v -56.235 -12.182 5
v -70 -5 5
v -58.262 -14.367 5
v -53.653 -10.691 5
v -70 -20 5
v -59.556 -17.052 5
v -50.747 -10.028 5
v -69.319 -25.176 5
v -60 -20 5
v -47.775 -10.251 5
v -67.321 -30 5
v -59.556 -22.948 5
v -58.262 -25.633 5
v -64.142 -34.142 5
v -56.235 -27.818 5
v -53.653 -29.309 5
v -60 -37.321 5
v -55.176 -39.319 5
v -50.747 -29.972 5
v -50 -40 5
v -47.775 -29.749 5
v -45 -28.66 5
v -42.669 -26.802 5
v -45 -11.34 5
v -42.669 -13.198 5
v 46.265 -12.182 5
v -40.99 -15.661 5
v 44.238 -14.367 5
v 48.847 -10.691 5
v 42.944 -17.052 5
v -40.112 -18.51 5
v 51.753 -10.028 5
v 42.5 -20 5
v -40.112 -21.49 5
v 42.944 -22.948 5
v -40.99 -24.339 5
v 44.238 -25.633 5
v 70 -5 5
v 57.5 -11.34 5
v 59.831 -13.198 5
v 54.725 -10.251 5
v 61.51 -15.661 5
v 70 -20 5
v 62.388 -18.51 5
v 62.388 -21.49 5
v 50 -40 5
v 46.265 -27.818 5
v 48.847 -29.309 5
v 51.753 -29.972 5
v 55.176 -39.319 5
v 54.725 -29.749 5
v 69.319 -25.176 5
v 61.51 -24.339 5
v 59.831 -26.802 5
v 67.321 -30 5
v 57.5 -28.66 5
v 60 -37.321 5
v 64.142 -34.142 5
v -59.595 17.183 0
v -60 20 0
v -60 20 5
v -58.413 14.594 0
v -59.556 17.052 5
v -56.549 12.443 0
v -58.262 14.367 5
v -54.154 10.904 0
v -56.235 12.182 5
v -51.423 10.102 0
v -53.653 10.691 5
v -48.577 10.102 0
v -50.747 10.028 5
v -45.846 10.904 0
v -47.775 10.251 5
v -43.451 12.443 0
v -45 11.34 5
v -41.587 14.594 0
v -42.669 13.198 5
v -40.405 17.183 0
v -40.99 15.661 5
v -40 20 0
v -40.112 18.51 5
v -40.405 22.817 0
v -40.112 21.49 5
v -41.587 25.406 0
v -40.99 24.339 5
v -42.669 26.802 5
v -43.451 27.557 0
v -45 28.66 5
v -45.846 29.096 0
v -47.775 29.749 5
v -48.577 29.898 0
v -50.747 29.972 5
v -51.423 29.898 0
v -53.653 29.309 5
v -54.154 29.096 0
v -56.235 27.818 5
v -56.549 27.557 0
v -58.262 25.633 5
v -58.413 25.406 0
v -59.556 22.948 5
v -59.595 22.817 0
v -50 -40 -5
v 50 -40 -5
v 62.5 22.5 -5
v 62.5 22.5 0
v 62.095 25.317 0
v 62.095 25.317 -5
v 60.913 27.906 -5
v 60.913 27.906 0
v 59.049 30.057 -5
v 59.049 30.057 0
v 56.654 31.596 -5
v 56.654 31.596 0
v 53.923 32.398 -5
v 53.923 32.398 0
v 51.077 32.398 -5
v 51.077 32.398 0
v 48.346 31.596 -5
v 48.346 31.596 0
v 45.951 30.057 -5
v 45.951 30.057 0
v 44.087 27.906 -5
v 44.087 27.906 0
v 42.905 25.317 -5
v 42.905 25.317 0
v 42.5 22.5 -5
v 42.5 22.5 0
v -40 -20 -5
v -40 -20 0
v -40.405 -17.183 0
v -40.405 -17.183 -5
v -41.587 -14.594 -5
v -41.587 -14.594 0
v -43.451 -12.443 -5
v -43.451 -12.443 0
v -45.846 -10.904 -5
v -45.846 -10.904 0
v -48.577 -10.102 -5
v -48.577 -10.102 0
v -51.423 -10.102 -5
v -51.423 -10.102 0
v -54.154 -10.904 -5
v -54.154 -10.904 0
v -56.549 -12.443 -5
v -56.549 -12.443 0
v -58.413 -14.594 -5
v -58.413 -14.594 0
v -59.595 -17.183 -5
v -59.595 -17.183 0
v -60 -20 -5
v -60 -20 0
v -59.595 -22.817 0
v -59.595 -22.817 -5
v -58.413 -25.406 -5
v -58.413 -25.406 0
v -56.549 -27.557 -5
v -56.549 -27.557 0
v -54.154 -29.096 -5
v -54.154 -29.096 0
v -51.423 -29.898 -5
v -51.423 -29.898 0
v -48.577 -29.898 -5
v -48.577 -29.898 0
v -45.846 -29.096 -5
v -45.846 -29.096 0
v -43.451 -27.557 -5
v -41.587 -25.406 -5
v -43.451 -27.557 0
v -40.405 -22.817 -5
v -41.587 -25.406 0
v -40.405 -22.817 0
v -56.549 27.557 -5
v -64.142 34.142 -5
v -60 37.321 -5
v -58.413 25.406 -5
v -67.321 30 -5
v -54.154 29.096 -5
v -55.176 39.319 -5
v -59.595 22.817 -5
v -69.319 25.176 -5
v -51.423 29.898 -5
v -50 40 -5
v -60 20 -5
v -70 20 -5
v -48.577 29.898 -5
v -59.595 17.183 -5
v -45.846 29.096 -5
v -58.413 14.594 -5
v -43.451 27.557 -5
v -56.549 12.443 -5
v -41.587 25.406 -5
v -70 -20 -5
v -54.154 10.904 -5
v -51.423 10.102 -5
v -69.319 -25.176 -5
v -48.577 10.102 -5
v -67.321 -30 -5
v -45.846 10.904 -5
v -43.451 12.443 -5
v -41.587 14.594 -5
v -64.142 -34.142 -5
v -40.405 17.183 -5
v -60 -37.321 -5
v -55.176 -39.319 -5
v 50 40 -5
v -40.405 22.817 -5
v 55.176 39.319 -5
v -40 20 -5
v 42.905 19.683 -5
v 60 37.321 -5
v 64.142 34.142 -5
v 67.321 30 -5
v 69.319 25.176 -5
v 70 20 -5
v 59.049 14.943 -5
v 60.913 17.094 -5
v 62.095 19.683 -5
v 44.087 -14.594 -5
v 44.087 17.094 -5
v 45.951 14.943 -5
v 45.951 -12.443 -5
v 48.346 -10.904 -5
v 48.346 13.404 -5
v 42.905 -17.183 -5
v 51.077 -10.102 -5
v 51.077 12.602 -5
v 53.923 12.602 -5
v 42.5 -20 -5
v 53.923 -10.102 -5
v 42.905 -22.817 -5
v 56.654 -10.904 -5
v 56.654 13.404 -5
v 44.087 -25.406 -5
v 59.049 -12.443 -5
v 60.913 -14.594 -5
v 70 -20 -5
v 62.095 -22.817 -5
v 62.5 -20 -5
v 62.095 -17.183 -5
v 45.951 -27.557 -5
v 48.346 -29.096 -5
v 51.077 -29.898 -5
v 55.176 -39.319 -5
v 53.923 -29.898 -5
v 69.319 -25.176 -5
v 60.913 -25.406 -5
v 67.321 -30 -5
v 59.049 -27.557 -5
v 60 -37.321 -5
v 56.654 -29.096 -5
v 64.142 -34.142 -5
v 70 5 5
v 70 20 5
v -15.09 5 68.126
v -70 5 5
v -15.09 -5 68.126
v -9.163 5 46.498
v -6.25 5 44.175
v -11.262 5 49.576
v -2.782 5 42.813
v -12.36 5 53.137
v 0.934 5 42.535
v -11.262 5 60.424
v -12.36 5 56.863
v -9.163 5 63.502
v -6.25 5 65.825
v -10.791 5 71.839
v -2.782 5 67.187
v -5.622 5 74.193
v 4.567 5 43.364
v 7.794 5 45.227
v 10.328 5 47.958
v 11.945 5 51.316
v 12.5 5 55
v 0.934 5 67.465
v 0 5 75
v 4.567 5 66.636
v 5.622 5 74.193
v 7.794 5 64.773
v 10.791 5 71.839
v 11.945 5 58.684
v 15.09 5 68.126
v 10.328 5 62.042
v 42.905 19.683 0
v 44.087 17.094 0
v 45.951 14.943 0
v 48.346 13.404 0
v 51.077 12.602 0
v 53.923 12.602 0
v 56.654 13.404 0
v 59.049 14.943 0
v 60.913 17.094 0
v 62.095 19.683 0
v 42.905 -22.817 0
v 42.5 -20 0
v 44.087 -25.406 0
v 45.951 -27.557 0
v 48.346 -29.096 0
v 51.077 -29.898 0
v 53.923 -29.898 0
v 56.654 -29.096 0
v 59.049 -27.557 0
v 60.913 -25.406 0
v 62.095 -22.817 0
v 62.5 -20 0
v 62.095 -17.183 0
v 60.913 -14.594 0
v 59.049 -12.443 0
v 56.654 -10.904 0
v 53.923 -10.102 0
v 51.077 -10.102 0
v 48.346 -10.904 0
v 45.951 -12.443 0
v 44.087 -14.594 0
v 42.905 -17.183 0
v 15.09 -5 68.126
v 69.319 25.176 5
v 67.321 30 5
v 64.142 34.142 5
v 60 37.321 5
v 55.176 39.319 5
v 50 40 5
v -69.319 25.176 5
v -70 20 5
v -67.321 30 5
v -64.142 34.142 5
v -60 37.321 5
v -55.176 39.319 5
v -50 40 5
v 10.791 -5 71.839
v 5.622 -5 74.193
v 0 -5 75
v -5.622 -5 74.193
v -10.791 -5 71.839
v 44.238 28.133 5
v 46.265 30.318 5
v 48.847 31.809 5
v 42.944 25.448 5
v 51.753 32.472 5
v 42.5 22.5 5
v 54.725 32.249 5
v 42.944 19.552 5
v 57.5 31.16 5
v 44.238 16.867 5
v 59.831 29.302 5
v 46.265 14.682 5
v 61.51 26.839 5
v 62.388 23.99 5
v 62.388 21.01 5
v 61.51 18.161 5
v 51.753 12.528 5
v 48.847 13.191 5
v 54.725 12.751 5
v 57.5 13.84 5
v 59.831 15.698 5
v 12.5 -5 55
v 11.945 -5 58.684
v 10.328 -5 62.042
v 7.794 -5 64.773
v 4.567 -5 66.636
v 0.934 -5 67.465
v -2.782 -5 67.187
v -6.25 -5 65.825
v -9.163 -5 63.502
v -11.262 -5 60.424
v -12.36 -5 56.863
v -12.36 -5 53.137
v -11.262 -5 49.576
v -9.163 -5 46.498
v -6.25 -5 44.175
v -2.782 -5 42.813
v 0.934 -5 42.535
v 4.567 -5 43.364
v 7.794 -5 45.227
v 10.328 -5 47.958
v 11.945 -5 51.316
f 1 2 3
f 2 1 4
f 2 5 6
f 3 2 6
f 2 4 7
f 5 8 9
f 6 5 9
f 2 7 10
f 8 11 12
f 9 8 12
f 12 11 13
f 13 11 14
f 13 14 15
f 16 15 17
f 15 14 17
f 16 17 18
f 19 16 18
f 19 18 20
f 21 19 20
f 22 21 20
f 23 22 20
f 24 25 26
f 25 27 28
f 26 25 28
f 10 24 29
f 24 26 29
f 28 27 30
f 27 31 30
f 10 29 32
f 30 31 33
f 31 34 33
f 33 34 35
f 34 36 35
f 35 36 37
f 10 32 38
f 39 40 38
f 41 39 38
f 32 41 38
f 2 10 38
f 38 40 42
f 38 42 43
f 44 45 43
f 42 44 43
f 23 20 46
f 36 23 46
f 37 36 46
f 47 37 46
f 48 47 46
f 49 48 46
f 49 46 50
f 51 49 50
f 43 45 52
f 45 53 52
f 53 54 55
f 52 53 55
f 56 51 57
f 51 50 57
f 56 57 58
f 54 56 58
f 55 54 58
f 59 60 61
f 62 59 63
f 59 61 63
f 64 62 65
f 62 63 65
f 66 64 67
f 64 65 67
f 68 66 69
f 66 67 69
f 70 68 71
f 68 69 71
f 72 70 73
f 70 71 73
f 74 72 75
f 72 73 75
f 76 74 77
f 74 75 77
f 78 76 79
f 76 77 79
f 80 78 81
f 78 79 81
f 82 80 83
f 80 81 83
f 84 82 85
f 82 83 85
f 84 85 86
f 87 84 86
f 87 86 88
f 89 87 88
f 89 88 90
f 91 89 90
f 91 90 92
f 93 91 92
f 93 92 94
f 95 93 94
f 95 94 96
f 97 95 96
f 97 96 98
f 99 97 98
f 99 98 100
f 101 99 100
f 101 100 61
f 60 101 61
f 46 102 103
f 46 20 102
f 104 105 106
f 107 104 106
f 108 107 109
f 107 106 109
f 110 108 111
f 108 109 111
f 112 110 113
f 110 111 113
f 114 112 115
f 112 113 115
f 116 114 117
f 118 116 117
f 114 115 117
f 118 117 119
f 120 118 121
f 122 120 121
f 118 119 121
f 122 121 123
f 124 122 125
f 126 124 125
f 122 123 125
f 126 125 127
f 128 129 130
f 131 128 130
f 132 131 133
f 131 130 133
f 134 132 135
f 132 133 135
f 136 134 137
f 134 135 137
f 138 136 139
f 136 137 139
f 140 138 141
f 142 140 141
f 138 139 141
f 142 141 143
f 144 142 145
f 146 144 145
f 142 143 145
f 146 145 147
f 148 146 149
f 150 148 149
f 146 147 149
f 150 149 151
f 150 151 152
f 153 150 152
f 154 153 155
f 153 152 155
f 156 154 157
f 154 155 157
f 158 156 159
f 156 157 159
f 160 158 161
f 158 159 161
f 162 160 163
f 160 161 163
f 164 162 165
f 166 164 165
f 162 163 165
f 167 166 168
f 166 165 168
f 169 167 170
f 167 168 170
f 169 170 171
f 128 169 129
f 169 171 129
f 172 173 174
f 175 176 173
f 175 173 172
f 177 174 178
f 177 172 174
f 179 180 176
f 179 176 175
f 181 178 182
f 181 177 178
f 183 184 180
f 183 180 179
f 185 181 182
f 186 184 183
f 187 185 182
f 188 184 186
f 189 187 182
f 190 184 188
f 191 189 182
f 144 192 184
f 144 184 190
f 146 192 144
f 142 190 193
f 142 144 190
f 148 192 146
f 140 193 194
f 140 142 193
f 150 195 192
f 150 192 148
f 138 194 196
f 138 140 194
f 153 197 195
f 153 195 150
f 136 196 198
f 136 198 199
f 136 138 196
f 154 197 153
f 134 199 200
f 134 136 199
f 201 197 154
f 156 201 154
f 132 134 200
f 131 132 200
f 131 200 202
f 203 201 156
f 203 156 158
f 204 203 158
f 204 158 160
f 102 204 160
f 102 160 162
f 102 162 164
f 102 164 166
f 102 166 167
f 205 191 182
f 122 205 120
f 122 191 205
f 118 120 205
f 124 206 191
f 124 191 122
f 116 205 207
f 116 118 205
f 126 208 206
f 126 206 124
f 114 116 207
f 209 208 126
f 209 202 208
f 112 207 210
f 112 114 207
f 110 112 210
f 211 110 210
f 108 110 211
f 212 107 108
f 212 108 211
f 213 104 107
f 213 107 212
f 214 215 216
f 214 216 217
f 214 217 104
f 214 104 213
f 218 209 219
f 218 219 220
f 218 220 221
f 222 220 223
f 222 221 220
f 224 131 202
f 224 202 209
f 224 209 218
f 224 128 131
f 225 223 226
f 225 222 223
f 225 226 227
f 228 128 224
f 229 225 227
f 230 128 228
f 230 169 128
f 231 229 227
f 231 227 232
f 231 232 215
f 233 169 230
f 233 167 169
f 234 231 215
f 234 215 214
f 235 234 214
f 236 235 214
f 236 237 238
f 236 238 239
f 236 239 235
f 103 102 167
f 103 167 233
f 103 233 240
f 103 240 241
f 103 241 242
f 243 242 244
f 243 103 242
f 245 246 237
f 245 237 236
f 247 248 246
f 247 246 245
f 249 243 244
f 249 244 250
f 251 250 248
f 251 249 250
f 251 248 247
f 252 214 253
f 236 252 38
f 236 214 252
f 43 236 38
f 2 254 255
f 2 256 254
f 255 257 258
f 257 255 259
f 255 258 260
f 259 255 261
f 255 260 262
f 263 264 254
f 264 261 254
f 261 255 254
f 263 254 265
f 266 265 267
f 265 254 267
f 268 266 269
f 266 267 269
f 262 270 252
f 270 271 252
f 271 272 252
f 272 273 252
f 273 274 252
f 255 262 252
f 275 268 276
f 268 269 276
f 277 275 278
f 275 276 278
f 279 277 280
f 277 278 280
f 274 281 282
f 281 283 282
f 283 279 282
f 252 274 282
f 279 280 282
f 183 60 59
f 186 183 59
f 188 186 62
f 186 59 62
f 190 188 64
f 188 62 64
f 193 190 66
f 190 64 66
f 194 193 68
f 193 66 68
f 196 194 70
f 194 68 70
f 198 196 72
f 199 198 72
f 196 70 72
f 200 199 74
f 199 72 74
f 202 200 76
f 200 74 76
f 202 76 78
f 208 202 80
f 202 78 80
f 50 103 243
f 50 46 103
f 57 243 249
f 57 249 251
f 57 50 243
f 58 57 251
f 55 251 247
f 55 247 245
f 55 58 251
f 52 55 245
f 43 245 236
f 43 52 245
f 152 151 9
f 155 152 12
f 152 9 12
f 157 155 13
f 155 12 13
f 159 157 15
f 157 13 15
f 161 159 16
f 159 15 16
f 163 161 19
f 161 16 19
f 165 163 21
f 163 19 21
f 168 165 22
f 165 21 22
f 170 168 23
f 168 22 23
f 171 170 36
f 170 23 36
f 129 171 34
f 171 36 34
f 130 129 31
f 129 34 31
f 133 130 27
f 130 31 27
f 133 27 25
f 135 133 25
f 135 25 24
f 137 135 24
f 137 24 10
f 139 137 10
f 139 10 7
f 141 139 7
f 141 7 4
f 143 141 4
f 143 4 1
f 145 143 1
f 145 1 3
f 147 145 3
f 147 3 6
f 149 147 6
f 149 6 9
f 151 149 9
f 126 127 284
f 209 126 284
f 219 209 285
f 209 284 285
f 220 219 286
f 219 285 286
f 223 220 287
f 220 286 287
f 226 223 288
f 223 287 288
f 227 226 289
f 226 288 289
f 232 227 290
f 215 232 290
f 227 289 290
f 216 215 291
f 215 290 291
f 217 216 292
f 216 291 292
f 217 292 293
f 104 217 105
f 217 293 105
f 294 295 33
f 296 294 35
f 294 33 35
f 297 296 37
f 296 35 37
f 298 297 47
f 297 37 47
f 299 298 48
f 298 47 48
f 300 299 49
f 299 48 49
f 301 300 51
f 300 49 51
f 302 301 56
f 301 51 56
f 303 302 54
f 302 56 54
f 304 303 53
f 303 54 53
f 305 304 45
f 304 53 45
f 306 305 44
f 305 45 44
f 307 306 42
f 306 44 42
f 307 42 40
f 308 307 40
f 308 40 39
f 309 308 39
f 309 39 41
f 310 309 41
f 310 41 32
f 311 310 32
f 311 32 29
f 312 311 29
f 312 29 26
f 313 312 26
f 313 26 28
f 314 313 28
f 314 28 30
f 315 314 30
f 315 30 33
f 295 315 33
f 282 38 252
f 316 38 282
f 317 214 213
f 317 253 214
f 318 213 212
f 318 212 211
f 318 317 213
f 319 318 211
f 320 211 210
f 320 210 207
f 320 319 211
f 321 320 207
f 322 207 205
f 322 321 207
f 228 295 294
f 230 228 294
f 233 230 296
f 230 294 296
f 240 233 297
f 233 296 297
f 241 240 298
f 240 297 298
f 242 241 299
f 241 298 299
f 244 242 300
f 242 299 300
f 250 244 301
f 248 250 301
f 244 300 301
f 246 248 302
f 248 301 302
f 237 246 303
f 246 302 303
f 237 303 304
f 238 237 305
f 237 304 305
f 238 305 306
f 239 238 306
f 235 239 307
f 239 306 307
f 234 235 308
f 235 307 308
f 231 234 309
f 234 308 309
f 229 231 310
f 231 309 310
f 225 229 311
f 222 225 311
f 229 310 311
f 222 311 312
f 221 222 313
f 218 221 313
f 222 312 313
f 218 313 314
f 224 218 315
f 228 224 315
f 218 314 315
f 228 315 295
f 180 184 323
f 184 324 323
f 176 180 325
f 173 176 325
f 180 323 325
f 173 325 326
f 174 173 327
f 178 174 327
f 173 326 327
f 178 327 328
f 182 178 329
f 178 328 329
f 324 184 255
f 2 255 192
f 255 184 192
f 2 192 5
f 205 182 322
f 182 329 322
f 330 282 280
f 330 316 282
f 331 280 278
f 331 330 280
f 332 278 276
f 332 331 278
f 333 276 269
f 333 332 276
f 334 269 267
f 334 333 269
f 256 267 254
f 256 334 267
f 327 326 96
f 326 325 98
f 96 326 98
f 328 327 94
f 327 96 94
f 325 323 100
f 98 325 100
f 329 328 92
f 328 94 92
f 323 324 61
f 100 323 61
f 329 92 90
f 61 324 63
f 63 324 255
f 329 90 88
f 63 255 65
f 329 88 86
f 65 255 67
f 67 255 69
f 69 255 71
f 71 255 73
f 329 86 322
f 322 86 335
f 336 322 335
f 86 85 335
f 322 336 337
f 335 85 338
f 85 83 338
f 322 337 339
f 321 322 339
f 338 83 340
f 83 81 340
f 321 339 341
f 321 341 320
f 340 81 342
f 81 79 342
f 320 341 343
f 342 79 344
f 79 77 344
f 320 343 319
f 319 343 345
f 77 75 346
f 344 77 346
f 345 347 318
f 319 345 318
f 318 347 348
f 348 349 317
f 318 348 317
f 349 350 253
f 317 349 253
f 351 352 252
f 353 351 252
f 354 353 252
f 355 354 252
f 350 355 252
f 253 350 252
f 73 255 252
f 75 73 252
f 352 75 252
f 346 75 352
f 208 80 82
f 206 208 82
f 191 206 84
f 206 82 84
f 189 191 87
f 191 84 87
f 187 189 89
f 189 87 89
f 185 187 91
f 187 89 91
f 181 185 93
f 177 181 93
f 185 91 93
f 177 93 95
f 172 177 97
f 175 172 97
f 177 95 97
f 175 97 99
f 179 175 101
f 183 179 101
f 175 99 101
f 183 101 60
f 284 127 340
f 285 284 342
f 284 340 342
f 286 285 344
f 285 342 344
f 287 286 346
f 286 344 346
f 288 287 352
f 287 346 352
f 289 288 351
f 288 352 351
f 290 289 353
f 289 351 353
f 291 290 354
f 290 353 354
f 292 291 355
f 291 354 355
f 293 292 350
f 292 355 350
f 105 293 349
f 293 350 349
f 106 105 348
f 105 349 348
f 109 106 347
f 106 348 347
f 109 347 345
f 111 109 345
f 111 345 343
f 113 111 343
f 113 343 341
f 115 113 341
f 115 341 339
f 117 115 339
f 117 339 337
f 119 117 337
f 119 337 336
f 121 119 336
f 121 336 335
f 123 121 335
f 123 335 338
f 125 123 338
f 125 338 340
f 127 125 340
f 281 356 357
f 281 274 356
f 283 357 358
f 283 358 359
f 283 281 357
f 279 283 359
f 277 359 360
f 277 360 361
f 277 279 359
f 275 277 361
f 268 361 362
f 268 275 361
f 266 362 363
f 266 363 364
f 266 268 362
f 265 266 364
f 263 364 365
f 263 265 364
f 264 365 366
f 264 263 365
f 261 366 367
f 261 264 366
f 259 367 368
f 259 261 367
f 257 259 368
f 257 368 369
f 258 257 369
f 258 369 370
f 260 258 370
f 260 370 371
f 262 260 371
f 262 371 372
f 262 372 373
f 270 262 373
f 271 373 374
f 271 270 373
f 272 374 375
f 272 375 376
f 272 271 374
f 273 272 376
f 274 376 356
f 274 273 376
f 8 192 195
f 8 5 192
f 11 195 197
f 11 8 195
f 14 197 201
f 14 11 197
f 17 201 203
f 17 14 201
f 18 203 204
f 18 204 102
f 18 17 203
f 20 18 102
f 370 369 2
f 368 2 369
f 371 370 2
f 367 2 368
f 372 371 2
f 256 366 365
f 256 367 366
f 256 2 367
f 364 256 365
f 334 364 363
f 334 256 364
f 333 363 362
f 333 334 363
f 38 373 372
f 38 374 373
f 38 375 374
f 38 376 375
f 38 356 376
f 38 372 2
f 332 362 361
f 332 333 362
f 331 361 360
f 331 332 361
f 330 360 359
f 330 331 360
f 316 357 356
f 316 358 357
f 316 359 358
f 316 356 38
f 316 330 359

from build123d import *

# Parameters (mm, degrees)
F0_W     = 140
F0_H     = 10
F1_DEPTH = 40
F0_R     = 12.5
F2_DEPTH = 5
F3_R     = 20
F5_D     = 20
F5_DEPTH = 5.001
F6_D     = 20
F7_D     = 20
F7_DEPTH = 5.001
F8_D     = 20
F9_D     = 20
F9_DEPTH = 5.001
F10_D    = 20


with BuildPart() as f1:
    # F0 (on Front) → F1 (new body, symmetric)
    with BuildSketch(Plane.XZ):
        Rectangle(F0_W, F0_H)
    extrude(amount=F1_DEPTH, both=True)

    # F0 (on Front) → F2 (join, symmetric)
    with BuildSketch(Plane.XZ):
        Rectangle(F0_W, F0_H)
        with BuildLine():
            Line((-70, 5), (70, 5))
            Line((70, 5), (15.0900003586, 68.126000502))
            ThreePointArc((15.0900003586, 68.126000502), (0, 75), (-15.0900003586, 68.126000502))
            Line((-15.0900003586, 68.126000502), (-70, 5))
        make_face()
        with Locations((0, 55)):
            Circle(F0_R, mode=Mode.SUBTRACT)
    extrude(amount=F2_DEPTH, both=True)

    # F3
    f3_edges = [f1.edges().sort_by_distance(p)[0] for p in [
        (-70, 40, 0),
        (-70, -40, 0),
        (70, 40, 0),
        (70, -40, 0),
    ]]
    fillet(f3_edges, radius=F3_R)

    # F5 (through all, one way)
    with BuildSketch(Plane.XY):
        with Locations((52.5, 22.5)):
            Circle(F5_D / 2)
    extrude(amount=-F5_DEPTH, mode=Mode.SUBTRACT)

    # F6 (through all)
    with Locations(Plane(origin=(0, 0, 0), x_dir=(1, 0, 0), z_dir=(0, 0, -1))):
        with Locations((52.5, -22.5)):
            Hole(F6_D / 2)

    # F7 (through all, one way)
    with BuildSketch(Plane.XY):
        with Locations((-50, 20)):
            Circle(F7_D / 2)
    extrude(amount=-F7_DEPTH, mode=Mode.SUBTRACT)

    # F8 (through all)
    with Locations(Plane(origin=(0, 0, 0), x_dir=(1, 0, 0), z_dir=(0, 0, -1))):
        with Locations((-50, -20)):
            Hole(F8_D / 2)

    # F9 (through all, one way)
    with BuildSketch(Plane.XY):
        with Locations((-50, -20), (52.5, -20)):
            Circle(F9_D / 2)
    extrude(amount=-F9_DEPTH, mode=Mode.SUBTRACT)

    # F10 (through all)
    with Locations(Plane(origin=(0, 0, 0), x_dir=(1, 0, 0), z_dir=(0, 0, -1))):
        with Locations((-50, 20), (52.5, 20)):
            Hole(F10_D / 2)


solid = f1.part
